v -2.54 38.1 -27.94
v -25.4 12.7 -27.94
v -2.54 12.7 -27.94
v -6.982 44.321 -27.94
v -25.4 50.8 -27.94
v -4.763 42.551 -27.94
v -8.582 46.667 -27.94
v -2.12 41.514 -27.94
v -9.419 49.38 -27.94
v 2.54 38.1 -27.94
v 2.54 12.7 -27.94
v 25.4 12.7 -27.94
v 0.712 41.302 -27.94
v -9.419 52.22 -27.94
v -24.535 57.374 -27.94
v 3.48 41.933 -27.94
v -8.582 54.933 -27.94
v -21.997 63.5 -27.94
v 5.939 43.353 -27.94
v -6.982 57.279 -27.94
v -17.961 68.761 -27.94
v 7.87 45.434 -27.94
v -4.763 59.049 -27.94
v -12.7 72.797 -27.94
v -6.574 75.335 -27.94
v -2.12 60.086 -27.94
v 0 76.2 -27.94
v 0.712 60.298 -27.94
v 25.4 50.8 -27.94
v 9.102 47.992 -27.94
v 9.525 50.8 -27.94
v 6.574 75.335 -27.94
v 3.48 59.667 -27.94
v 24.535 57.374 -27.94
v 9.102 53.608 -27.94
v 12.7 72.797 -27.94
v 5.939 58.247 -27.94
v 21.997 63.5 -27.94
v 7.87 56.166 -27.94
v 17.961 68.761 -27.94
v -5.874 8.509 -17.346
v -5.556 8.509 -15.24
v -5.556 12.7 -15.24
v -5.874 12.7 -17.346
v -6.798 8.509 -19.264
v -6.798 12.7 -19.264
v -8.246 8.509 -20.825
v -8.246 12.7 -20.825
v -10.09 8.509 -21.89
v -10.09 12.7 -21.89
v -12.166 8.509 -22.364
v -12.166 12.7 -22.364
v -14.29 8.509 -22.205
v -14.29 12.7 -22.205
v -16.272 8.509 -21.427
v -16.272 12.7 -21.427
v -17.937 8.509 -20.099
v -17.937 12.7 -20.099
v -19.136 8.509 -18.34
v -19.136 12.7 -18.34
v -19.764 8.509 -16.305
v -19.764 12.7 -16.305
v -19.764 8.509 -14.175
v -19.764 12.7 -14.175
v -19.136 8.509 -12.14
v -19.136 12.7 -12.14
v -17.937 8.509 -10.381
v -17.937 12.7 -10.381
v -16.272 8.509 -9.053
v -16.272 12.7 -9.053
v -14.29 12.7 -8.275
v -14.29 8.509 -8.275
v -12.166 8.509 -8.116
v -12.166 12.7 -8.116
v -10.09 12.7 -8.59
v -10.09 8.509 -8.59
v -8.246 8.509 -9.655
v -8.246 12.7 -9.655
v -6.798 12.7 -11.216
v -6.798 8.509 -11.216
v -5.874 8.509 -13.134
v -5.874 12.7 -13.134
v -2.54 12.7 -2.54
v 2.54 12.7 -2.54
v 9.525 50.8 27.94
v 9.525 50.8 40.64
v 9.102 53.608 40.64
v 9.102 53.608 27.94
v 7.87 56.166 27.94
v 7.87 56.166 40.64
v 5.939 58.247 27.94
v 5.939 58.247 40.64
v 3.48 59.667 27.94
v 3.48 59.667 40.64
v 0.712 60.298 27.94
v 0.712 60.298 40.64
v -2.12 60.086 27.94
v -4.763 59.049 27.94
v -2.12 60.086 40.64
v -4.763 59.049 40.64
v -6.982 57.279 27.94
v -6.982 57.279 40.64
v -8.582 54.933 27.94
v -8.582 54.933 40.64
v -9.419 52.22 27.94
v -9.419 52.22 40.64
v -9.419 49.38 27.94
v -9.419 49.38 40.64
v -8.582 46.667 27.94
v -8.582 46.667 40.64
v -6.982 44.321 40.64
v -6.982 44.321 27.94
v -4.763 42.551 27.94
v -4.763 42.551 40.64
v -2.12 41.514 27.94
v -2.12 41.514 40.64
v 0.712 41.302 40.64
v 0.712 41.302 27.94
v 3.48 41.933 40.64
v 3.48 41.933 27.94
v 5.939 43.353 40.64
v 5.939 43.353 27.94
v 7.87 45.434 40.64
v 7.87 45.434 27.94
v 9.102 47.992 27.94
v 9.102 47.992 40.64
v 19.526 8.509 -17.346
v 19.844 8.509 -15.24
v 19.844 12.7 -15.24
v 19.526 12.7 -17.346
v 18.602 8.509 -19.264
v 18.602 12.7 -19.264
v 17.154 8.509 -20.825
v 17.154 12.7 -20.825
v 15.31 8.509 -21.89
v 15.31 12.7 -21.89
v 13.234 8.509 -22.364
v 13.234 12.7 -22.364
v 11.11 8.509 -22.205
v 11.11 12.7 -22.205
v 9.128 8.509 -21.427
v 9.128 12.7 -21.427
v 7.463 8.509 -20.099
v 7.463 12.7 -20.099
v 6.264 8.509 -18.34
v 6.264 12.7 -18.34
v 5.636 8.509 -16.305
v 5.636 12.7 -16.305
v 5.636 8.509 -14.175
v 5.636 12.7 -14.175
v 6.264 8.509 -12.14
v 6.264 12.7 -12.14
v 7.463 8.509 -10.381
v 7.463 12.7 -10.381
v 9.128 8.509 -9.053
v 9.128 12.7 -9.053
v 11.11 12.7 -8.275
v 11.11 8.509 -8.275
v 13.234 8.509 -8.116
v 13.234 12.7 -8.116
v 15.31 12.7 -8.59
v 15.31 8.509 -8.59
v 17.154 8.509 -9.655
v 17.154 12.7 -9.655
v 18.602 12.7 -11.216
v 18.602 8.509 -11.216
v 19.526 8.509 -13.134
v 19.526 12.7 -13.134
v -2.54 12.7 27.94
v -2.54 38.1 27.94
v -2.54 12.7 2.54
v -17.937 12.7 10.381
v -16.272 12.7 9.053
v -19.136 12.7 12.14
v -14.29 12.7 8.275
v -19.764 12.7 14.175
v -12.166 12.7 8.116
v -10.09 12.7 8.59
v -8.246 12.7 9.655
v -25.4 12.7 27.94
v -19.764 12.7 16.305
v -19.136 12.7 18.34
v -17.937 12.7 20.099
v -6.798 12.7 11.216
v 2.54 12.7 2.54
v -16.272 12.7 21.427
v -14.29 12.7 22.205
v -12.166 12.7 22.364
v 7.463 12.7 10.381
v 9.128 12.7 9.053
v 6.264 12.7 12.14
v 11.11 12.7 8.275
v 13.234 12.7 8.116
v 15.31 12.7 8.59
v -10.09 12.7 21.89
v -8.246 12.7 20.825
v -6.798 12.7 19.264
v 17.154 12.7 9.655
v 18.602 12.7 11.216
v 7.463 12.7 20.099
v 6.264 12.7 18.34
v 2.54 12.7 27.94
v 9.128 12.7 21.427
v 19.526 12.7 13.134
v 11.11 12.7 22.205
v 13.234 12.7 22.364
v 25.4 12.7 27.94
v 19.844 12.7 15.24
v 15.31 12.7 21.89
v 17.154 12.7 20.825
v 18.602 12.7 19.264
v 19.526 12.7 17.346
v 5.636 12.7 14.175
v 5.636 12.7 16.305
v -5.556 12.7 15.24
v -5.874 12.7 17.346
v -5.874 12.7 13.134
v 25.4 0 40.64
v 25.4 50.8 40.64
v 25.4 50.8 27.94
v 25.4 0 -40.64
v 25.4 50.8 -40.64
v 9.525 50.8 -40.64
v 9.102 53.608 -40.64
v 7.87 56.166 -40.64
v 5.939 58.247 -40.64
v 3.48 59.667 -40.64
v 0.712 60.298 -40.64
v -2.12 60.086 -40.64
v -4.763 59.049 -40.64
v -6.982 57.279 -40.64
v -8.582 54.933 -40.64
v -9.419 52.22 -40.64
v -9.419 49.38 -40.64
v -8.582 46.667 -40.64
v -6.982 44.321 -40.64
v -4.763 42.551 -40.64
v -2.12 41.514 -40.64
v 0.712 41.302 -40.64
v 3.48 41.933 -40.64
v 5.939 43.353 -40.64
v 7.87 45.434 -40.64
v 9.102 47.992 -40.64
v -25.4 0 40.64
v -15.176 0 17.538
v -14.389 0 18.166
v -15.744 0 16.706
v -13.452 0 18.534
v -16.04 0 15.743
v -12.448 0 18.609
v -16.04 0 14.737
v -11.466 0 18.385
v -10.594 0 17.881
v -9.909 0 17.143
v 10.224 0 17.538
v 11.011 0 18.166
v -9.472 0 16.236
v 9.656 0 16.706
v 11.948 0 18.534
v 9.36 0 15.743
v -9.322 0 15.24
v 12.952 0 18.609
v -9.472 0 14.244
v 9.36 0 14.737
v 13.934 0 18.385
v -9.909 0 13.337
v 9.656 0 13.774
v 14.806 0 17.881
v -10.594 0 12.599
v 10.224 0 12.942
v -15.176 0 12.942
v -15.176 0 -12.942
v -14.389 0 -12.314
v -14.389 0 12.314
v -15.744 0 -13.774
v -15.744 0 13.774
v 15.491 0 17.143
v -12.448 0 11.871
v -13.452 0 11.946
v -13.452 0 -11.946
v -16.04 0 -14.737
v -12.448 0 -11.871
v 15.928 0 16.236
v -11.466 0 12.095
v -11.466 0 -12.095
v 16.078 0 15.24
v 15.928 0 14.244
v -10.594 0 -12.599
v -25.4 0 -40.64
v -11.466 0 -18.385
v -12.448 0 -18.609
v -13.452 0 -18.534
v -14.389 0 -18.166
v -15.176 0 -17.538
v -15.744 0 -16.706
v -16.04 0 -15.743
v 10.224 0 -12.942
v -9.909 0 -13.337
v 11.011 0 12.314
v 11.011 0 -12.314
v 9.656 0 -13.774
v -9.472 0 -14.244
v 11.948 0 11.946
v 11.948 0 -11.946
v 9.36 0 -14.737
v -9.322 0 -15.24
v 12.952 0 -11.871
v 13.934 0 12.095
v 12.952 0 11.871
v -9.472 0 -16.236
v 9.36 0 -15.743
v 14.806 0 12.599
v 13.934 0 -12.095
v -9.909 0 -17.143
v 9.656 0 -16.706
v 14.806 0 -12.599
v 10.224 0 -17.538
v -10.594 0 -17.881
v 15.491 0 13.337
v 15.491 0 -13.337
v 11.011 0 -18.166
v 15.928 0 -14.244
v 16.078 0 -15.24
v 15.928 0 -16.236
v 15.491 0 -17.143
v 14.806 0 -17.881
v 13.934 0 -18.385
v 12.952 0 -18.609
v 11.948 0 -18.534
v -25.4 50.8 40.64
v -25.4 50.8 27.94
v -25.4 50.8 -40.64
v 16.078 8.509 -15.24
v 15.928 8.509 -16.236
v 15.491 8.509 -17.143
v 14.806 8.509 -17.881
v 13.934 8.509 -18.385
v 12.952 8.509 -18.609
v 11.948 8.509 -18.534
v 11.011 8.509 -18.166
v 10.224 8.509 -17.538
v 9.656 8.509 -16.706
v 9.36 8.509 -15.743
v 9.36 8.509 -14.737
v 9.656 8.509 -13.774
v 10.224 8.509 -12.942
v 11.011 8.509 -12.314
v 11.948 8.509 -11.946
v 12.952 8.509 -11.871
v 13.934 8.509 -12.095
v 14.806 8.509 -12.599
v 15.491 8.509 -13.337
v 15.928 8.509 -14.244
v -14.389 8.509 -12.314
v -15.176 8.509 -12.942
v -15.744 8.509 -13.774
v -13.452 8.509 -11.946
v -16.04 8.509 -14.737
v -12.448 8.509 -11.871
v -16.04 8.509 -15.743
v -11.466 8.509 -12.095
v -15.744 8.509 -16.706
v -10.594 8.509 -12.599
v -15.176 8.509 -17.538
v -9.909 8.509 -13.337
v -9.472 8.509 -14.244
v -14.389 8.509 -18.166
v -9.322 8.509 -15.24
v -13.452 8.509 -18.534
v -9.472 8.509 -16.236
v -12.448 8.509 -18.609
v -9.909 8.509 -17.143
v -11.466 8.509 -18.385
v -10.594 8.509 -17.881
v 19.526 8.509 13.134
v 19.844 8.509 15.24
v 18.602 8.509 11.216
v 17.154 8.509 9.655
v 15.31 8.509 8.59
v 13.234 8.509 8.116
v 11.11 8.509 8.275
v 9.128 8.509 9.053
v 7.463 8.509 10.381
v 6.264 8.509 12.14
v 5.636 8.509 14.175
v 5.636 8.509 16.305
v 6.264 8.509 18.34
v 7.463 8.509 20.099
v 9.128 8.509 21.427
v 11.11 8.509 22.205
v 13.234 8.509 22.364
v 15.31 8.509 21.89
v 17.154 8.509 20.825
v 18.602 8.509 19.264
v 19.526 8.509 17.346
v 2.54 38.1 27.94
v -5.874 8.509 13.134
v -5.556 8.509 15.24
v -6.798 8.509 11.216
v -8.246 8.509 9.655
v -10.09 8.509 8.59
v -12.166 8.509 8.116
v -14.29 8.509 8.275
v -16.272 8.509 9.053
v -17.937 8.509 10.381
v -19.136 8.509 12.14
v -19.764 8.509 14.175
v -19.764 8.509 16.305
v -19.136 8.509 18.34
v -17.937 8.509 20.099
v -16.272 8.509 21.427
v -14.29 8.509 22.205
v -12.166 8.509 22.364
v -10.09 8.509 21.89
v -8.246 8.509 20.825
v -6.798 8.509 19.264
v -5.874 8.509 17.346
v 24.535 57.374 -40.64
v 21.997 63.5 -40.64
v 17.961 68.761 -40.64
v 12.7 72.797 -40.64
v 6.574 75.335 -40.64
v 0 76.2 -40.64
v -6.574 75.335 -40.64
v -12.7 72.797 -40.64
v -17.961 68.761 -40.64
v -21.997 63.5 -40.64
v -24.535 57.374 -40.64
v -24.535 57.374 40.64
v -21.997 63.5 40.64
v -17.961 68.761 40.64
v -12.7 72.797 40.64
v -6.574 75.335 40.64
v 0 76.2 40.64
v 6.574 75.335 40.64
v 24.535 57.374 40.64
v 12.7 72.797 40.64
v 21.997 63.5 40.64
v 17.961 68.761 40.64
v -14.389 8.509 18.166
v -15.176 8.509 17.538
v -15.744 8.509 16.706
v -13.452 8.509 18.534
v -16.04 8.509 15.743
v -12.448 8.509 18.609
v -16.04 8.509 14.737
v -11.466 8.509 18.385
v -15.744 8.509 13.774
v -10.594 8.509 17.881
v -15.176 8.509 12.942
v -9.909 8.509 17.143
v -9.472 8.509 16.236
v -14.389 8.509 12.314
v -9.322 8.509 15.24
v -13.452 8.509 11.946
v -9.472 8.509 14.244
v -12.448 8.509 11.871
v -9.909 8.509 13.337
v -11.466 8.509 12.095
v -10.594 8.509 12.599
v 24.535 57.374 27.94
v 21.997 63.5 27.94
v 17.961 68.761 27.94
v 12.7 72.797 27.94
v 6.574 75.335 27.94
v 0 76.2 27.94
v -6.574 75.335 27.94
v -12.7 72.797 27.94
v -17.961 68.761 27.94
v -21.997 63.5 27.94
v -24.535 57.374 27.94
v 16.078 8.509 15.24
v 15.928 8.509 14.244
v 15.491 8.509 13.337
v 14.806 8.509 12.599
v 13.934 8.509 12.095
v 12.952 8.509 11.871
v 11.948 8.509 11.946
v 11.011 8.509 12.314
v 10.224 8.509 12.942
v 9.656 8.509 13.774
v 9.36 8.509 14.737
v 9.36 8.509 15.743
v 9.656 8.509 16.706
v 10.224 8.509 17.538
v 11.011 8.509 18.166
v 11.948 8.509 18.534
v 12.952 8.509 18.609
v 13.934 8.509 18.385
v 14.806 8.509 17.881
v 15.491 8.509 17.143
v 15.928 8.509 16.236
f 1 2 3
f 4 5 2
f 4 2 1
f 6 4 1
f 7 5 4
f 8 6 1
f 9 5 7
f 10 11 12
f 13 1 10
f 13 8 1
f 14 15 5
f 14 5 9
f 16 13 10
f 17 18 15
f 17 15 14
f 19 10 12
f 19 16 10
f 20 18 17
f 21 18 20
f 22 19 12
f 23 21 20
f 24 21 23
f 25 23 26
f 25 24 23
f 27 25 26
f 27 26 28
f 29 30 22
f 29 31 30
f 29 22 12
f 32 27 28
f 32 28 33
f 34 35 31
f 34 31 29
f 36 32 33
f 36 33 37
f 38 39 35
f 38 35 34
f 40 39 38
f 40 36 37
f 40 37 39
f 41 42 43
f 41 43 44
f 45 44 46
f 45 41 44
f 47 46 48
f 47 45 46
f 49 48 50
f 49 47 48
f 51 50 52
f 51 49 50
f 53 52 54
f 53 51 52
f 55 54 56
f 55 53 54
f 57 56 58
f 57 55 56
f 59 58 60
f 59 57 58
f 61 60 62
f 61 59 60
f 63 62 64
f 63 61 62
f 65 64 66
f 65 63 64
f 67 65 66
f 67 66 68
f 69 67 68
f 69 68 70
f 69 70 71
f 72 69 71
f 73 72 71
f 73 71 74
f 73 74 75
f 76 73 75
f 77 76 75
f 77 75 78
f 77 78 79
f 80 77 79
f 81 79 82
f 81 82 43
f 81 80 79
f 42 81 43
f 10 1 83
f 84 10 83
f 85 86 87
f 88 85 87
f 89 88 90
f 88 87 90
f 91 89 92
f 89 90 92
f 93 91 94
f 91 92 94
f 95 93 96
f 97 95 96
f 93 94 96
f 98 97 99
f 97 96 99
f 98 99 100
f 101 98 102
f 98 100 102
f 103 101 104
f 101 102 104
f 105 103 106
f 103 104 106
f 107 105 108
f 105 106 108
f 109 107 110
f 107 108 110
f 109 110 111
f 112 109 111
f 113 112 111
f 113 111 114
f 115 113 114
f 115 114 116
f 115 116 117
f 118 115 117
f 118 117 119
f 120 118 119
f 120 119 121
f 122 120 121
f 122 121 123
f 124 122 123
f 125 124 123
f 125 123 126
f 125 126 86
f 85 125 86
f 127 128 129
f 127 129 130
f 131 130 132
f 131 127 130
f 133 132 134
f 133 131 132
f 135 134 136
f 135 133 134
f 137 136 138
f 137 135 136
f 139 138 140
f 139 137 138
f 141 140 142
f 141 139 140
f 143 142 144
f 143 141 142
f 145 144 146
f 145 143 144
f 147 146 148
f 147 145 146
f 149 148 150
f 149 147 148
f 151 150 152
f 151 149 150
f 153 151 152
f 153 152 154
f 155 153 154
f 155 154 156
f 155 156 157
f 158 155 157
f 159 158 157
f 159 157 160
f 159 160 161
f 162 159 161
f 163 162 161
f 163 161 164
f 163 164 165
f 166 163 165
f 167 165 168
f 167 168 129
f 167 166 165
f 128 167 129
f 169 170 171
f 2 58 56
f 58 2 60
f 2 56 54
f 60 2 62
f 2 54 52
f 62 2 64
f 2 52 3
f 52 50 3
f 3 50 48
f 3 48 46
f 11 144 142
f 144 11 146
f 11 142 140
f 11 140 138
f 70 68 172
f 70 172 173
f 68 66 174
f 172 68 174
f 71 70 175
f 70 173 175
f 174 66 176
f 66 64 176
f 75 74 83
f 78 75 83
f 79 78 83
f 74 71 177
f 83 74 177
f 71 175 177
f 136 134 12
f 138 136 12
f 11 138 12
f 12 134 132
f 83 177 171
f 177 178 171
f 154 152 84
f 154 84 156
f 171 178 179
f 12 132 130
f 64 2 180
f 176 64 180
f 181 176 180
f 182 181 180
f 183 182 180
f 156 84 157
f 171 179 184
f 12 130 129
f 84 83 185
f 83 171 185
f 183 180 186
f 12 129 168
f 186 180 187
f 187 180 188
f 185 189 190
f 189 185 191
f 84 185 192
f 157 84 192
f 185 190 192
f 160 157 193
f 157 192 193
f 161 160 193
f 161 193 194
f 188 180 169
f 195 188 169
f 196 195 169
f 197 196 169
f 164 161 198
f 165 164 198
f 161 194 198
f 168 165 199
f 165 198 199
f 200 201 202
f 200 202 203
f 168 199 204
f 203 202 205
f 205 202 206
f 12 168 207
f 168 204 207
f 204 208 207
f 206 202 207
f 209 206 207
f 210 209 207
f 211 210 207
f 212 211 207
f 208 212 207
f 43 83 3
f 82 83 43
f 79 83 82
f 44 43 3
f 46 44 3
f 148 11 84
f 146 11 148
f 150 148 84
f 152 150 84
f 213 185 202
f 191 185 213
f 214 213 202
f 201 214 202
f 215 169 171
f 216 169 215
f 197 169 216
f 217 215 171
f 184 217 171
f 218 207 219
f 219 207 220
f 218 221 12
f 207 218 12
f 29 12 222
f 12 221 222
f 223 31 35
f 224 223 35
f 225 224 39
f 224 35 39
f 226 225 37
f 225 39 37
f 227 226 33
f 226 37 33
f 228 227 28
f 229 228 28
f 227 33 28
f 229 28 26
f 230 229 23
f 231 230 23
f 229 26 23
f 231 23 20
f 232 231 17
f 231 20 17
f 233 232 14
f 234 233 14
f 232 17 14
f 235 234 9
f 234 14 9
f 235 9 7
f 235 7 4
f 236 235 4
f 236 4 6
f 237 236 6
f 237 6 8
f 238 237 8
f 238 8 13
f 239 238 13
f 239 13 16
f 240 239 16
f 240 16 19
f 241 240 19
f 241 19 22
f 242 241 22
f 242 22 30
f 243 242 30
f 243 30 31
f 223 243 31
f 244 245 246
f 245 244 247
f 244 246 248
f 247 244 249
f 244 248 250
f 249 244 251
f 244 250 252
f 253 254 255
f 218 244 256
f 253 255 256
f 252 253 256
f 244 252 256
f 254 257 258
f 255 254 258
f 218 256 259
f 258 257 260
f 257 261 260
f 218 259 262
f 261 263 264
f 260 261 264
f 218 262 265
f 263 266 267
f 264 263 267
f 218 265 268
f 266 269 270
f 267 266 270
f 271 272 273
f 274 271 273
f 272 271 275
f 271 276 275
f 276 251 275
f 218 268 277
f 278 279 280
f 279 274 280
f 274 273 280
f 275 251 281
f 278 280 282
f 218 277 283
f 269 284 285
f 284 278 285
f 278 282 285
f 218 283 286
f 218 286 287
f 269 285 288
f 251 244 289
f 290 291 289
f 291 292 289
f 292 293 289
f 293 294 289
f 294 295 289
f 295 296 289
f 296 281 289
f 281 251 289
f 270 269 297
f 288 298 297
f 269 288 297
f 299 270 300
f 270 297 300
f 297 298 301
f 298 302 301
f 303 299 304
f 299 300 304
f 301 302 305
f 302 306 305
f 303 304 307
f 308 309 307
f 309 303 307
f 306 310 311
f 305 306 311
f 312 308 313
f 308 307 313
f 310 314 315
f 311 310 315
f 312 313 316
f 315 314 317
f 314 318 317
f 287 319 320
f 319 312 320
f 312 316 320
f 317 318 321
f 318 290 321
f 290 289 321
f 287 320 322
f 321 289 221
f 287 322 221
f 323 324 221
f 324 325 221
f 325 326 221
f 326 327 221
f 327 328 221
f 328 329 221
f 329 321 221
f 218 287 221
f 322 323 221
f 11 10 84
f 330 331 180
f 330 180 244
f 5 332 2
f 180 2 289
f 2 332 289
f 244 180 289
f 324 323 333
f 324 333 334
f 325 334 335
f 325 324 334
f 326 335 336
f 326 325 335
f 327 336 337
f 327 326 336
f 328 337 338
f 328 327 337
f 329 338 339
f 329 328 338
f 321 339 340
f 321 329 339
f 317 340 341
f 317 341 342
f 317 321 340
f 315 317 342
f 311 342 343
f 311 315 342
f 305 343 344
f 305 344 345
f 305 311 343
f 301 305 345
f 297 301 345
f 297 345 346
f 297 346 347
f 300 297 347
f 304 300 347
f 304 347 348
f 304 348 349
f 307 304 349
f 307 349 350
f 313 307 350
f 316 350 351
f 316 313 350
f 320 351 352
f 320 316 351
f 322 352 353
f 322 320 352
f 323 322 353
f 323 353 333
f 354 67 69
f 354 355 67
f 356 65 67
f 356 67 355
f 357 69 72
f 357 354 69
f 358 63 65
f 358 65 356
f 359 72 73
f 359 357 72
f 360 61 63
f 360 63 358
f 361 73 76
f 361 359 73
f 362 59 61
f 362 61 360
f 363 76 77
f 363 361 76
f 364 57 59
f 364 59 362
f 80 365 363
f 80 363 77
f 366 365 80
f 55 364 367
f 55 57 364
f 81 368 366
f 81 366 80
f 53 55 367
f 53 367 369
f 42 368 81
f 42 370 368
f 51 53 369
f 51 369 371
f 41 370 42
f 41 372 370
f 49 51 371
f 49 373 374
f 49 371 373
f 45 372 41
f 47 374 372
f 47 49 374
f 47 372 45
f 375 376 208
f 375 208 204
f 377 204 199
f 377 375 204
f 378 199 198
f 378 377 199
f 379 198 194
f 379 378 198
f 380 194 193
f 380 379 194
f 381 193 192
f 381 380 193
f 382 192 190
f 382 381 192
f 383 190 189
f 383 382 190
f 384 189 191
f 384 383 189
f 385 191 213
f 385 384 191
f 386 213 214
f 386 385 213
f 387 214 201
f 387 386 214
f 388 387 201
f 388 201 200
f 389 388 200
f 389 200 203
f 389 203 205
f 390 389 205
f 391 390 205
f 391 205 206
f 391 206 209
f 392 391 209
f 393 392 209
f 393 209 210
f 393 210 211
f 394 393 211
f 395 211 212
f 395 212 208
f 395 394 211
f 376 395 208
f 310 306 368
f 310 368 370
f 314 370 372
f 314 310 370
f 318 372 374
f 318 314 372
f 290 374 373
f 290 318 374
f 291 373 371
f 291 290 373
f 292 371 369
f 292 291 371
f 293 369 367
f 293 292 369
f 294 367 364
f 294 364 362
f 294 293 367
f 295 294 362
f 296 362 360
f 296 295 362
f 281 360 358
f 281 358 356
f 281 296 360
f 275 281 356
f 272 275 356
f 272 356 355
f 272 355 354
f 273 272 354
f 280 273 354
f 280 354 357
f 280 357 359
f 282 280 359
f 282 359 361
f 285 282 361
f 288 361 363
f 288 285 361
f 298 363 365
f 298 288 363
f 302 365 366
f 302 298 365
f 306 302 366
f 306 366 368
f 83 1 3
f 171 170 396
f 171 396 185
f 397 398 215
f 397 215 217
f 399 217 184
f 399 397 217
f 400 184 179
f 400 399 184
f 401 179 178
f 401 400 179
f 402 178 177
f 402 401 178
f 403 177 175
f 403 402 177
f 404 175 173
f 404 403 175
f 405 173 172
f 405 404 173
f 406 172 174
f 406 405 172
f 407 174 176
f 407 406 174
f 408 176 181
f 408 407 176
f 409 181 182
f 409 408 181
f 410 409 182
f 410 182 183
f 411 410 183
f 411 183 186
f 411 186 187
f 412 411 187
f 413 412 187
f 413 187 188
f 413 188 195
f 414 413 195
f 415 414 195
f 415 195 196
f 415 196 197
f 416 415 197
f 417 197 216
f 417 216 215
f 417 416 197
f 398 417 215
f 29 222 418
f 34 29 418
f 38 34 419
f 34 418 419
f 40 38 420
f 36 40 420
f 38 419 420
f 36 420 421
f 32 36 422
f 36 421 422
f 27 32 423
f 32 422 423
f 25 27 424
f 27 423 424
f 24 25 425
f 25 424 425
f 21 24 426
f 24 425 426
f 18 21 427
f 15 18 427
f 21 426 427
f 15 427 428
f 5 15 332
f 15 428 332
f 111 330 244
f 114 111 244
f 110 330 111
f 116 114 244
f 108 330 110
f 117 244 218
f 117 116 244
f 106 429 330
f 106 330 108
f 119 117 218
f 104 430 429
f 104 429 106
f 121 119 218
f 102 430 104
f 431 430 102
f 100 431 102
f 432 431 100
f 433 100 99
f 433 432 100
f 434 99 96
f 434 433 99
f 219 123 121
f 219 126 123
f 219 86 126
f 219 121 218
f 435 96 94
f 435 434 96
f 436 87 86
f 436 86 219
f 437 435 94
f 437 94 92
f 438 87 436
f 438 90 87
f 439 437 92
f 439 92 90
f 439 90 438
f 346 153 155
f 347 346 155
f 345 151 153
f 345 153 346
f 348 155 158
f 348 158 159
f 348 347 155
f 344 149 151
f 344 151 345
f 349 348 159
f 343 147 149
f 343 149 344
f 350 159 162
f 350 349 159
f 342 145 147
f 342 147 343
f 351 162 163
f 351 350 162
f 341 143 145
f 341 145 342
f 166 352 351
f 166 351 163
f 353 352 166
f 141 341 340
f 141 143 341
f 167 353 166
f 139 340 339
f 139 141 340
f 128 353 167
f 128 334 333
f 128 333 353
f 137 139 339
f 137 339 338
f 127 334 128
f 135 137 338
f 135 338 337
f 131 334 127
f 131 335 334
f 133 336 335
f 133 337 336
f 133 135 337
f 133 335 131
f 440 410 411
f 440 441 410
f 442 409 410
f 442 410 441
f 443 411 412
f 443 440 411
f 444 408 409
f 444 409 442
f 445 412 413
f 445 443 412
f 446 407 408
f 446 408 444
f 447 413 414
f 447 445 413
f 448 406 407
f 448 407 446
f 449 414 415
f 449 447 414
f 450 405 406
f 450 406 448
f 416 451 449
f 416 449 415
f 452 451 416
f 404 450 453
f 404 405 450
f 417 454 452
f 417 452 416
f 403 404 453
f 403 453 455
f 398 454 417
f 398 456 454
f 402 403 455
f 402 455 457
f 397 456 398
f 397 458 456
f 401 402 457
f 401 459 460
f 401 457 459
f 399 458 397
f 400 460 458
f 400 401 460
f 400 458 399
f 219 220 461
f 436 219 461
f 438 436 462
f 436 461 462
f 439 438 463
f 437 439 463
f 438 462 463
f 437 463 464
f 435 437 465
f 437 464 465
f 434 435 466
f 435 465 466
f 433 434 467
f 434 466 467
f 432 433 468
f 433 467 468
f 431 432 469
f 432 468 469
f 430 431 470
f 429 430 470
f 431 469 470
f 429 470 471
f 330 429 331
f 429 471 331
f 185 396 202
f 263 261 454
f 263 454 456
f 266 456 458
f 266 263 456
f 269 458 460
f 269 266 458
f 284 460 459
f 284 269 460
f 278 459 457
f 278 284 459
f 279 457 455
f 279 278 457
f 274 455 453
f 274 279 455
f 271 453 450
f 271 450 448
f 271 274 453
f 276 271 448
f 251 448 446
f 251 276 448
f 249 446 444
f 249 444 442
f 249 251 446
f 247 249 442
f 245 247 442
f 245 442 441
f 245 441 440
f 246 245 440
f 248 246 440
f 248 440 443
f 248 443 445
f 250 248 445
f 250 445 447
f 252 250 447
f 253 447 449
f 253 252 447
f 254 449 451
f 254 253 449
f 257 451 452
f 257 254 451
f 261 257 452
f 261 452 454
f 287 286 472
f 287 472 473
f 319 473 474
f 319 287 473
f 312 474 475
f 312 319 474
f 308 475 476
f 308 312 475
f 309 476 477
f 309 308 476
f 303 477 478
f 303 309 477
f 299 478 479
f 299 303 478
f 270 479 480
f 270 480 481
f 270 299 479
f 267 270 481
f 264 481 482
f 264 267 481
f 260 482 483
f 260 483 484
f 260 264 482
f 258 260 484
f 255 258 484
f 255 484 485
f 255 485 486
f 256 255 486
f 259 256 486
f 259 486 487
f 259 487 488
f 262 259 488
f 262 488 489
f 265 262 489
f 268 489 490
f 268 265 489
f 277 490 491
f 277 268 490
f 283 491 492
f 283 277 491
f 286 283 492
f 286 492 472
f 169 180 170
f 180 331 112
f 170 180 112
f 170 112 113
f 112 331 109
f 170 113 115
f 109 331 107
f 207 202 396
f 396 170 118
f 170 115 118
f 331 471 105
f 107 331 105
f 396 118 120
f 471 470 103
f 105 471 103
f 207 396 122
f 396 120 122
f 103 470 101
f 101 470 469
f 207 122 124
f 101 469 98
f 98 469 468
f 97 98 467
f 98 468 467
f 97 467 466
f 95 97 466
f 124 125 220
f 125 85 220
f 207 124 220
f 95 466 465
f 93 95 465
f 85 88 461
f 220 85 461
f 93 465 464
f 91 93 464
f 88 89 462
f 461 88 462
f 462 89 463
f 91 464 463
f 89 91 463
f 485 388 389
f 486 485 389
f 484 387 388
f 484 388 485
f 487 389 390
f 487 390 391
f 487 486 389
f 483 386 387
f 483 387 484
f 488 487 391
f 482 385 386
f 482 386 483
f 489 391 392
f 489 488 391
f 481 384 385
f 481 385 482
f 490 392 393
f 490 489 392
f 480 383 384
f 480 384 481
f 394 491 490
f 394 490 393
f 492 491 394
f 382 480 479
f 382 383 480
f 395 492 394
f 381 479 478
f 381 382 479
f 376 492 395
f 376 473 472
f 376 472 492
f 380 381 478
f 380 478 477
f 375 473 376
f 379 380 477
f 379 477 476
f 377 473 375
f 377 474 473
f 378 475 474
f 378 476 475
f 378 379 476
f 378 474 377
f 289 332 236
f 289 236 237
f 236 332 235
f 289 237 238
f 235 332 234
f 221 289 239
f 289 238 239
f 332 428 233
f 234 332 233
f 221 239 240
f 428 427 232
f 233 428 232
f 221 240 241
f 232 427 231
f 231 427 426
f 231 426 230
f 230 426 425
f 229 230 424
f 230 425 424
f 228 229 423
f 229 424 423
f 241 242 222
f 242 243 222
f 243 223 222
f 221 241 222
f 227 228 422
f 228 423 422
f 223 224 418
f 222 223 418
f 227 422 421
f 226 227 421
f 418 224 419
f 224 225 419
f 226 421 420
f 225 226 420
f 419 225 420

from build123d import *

# Parameters (mm, degrees)
SKETCH1_W                                      = 50.8
SKETCH1_H                                      = 12.7
BOSS_EXTRUDE1_DEPTH                            = 27.94
BOSS_EXTRUDE2_START                            = 27.94
SKETCH1_3_W                                    = 50.8
SKETCH1_3_H                                    = 12.7
BOSS_EXTRUDE2_DEPTH                            = 12.7
BOSS_EXTRUDE3_START                            = -40.64
SKETCH1_4_W                                    = 50.8
SKETCH1_4_H                                    = 12.7
BOSS_EXTRUDE3_DEPTH                            = 12.7
SKETCH2_R                                      = 9.525
CUT_EXTRUDE1_DEPTH                             = 115.271774293
RIB6_REACH                                     = 92.018
SKETCH4_WALL_W                                 = 217.956683174
SKETCH4_WALL_H                                 = 5.08
CBORE_START                                    = 8.509
CBORE_FOR_1_4_BINDING_HEAD_MACHINE_S_2_R       = 7.14375
CBORE_FOR_1_4_BINDING_HEAD_MACHINE_SCREW_DEPTH = 4.191
CBORE_FOR_1_4_BINDING_HEAD_MACHINE_S_3_O_R     = 3.3782
CBORE_FOR_1_4_BINDING_HEAD_MACHINE_S_3_DEPTH   = 8.509


# Read off the part's stored shape, not the designer's step: CBORE for 1/4 Binding Head Machine Screw1
with BuildPart() as part:
    # Sketch1 → Boss-Extrude1 (new, symmetric)
    with BuildSketch(Plane.XY):
        with Locations((0, 6.35)):
            Rectangle(SKETCH1_W, SKETCH1_H)
    extrude(amount=BOSS_EXTRUDE1_DEPTH, both=True)

    # Sketch1<3> → Boss-Extrude2 (add)
    with BuildSketch(Plane.XY.offset(BOSS_EXTRUDE2_START)):
        with BuildLine():
            Line((-25.4, 50.8), (-25.4, 12.7))
            Line((-25.4, 12.7), (25.4, 12.7))
            Line((25.4, 12.7), (25.4, 50.8))
            ThreePointArc((25.4, 50.8), (0, 76.2), (-25.4, 50.8))
        make_face()
        with Locations((0, 6.35)):
            Rectangle(SKETCH1_3_W, SKETCH1_3_H)
    extrude(amount=BOSS_EXTRUDE2_DEPTH)

    # Sketch1<4> → Boss-Extrude3 (add)
    with BuildSketch(Plane.XY.offset(BOSS_EXTRUDE3_START)):
        with BuildLine():
            Line((-25.4, 50.8), (-25.4, 12.7))
            Line((-25.4, 12.7), (25.4, 12.7))
            Line((25.4, 12.7), (25.4, 50.8))
            ThreePointArc((25.4, 50.8), (0, 76.2), (-25.4, 50.8))
        make_face()
        with Locations((0, 6.35)):
            Rectangle(SKETCH1_4_W, SKETCH1_4_H)
    extrude(amount=BOSS_EXTRUDE3_DEPTH)

    # Sketch2 → Cut-Extrude1 (cut, through all)
    with BuildSketch(Plane.XY.offset(40.64)):
        with Locations((0, 50.8)):
            Circle(SKETCH2_R)
    extrude(amount=-CUT_EXTRUDE1_DEPTH, mode=Mode.SUBTRACT)

    # Sketch4 wall → Rib6 (add, up to next)
    with BuildSketch(Plane(origin=(0, 25.4, 15.24), x_dir=(0, -0.707106781187, -0.707106781187), z_dir=(0, 0.707106781187, -0.707106781187)), mode=Mode.PRIVATE) as rib6_sk1:
        Rectangle(SKETCH4_WALL_W, SKETCH4_WALL_H)
    rib6_tool1 = extrude(rib6_sk1.sketch, amount=-RIB6_REACH, mode=Mode.PRIVATE) - part.part
    rib6 = rib6_tool1.solids().sort_by_distance((0, 25.4, 15.24))[0]
    add(rib6)

    # Mirror1: Rib6 across plane
    add(rib6.mirror(Plane.XY))

    # CBORE for 1_4 Binding Head Machine S 2 → CBORE for 1/4 Binding Head Machine Screw1 (cut)
    with BuildSketch(Plane(origin=(0, 0, 0), x_dir=(1, 0, 0), z_dir=(0, 1, 0)).offset(CBORE_START)):
        with Locations((12.7, -15.24)):
            Circle(CBORE_FOR_1_4_BINDING_HEAD_MACHINE_S_2_R)
        with Locations((12.7, 15.24)):
            Circle(CBORE_FOR_1_4_BINDING_HEAD_MACHINE_S_2_R)
        with Locations((-12.7, -15.24)):
            Circle(CBORE_FOR_1_4_BINDING_HEAD_MACHINE_S_2_R)
        with Locations((-12.7, 15.24)):
            Circle(CBORE_FOR_1_4_BINDING_HEAD_MACHINE_S_2_R)
    extrude(amount=CBORE_FOR_1_4_BINDING_HEAD_MACHINE_SCREW_DEPTH, mode=Mode.SUBTRACT)

    # CBORE for 1_4 Binding Head Machine S 3 o → CBORE for 1_4 Binding Head Machine S 3 (cut)
    with BuildSketch(Plane(origin=(0, 0, 0), x_dir=(1, 0, 0), z_dir=(0, 1, 0))):
        with Locations((12.7, -15.24)):
            Circle(CBORE_FOR_1_4_BINDING_HEAD_MACHINE_S_3_O_R)
        with Locations((12.7, 15.24)):
            Circle(CBORE_FOR_1_4_BINDING_HEAD_MACHINE_S_3_O_R)
        with Locations((-12.7, -15.24)):
            Circle(CBORE_FOR_1_4_BINDING_HEAD_MACHINE_S_3_O_R)
        with Locations((-12.7, 15.24)):
            Circle(CBORE_FOR_1_4_BINDING_HEAD_MACHINE_S_3_O_R)
    extrude(amount=CBORE_FOR_1_4_BINDING_HEAD_MACHINE_S_3_DEPTH, mode=Mode.SUBTRACT)


solid = part.part
